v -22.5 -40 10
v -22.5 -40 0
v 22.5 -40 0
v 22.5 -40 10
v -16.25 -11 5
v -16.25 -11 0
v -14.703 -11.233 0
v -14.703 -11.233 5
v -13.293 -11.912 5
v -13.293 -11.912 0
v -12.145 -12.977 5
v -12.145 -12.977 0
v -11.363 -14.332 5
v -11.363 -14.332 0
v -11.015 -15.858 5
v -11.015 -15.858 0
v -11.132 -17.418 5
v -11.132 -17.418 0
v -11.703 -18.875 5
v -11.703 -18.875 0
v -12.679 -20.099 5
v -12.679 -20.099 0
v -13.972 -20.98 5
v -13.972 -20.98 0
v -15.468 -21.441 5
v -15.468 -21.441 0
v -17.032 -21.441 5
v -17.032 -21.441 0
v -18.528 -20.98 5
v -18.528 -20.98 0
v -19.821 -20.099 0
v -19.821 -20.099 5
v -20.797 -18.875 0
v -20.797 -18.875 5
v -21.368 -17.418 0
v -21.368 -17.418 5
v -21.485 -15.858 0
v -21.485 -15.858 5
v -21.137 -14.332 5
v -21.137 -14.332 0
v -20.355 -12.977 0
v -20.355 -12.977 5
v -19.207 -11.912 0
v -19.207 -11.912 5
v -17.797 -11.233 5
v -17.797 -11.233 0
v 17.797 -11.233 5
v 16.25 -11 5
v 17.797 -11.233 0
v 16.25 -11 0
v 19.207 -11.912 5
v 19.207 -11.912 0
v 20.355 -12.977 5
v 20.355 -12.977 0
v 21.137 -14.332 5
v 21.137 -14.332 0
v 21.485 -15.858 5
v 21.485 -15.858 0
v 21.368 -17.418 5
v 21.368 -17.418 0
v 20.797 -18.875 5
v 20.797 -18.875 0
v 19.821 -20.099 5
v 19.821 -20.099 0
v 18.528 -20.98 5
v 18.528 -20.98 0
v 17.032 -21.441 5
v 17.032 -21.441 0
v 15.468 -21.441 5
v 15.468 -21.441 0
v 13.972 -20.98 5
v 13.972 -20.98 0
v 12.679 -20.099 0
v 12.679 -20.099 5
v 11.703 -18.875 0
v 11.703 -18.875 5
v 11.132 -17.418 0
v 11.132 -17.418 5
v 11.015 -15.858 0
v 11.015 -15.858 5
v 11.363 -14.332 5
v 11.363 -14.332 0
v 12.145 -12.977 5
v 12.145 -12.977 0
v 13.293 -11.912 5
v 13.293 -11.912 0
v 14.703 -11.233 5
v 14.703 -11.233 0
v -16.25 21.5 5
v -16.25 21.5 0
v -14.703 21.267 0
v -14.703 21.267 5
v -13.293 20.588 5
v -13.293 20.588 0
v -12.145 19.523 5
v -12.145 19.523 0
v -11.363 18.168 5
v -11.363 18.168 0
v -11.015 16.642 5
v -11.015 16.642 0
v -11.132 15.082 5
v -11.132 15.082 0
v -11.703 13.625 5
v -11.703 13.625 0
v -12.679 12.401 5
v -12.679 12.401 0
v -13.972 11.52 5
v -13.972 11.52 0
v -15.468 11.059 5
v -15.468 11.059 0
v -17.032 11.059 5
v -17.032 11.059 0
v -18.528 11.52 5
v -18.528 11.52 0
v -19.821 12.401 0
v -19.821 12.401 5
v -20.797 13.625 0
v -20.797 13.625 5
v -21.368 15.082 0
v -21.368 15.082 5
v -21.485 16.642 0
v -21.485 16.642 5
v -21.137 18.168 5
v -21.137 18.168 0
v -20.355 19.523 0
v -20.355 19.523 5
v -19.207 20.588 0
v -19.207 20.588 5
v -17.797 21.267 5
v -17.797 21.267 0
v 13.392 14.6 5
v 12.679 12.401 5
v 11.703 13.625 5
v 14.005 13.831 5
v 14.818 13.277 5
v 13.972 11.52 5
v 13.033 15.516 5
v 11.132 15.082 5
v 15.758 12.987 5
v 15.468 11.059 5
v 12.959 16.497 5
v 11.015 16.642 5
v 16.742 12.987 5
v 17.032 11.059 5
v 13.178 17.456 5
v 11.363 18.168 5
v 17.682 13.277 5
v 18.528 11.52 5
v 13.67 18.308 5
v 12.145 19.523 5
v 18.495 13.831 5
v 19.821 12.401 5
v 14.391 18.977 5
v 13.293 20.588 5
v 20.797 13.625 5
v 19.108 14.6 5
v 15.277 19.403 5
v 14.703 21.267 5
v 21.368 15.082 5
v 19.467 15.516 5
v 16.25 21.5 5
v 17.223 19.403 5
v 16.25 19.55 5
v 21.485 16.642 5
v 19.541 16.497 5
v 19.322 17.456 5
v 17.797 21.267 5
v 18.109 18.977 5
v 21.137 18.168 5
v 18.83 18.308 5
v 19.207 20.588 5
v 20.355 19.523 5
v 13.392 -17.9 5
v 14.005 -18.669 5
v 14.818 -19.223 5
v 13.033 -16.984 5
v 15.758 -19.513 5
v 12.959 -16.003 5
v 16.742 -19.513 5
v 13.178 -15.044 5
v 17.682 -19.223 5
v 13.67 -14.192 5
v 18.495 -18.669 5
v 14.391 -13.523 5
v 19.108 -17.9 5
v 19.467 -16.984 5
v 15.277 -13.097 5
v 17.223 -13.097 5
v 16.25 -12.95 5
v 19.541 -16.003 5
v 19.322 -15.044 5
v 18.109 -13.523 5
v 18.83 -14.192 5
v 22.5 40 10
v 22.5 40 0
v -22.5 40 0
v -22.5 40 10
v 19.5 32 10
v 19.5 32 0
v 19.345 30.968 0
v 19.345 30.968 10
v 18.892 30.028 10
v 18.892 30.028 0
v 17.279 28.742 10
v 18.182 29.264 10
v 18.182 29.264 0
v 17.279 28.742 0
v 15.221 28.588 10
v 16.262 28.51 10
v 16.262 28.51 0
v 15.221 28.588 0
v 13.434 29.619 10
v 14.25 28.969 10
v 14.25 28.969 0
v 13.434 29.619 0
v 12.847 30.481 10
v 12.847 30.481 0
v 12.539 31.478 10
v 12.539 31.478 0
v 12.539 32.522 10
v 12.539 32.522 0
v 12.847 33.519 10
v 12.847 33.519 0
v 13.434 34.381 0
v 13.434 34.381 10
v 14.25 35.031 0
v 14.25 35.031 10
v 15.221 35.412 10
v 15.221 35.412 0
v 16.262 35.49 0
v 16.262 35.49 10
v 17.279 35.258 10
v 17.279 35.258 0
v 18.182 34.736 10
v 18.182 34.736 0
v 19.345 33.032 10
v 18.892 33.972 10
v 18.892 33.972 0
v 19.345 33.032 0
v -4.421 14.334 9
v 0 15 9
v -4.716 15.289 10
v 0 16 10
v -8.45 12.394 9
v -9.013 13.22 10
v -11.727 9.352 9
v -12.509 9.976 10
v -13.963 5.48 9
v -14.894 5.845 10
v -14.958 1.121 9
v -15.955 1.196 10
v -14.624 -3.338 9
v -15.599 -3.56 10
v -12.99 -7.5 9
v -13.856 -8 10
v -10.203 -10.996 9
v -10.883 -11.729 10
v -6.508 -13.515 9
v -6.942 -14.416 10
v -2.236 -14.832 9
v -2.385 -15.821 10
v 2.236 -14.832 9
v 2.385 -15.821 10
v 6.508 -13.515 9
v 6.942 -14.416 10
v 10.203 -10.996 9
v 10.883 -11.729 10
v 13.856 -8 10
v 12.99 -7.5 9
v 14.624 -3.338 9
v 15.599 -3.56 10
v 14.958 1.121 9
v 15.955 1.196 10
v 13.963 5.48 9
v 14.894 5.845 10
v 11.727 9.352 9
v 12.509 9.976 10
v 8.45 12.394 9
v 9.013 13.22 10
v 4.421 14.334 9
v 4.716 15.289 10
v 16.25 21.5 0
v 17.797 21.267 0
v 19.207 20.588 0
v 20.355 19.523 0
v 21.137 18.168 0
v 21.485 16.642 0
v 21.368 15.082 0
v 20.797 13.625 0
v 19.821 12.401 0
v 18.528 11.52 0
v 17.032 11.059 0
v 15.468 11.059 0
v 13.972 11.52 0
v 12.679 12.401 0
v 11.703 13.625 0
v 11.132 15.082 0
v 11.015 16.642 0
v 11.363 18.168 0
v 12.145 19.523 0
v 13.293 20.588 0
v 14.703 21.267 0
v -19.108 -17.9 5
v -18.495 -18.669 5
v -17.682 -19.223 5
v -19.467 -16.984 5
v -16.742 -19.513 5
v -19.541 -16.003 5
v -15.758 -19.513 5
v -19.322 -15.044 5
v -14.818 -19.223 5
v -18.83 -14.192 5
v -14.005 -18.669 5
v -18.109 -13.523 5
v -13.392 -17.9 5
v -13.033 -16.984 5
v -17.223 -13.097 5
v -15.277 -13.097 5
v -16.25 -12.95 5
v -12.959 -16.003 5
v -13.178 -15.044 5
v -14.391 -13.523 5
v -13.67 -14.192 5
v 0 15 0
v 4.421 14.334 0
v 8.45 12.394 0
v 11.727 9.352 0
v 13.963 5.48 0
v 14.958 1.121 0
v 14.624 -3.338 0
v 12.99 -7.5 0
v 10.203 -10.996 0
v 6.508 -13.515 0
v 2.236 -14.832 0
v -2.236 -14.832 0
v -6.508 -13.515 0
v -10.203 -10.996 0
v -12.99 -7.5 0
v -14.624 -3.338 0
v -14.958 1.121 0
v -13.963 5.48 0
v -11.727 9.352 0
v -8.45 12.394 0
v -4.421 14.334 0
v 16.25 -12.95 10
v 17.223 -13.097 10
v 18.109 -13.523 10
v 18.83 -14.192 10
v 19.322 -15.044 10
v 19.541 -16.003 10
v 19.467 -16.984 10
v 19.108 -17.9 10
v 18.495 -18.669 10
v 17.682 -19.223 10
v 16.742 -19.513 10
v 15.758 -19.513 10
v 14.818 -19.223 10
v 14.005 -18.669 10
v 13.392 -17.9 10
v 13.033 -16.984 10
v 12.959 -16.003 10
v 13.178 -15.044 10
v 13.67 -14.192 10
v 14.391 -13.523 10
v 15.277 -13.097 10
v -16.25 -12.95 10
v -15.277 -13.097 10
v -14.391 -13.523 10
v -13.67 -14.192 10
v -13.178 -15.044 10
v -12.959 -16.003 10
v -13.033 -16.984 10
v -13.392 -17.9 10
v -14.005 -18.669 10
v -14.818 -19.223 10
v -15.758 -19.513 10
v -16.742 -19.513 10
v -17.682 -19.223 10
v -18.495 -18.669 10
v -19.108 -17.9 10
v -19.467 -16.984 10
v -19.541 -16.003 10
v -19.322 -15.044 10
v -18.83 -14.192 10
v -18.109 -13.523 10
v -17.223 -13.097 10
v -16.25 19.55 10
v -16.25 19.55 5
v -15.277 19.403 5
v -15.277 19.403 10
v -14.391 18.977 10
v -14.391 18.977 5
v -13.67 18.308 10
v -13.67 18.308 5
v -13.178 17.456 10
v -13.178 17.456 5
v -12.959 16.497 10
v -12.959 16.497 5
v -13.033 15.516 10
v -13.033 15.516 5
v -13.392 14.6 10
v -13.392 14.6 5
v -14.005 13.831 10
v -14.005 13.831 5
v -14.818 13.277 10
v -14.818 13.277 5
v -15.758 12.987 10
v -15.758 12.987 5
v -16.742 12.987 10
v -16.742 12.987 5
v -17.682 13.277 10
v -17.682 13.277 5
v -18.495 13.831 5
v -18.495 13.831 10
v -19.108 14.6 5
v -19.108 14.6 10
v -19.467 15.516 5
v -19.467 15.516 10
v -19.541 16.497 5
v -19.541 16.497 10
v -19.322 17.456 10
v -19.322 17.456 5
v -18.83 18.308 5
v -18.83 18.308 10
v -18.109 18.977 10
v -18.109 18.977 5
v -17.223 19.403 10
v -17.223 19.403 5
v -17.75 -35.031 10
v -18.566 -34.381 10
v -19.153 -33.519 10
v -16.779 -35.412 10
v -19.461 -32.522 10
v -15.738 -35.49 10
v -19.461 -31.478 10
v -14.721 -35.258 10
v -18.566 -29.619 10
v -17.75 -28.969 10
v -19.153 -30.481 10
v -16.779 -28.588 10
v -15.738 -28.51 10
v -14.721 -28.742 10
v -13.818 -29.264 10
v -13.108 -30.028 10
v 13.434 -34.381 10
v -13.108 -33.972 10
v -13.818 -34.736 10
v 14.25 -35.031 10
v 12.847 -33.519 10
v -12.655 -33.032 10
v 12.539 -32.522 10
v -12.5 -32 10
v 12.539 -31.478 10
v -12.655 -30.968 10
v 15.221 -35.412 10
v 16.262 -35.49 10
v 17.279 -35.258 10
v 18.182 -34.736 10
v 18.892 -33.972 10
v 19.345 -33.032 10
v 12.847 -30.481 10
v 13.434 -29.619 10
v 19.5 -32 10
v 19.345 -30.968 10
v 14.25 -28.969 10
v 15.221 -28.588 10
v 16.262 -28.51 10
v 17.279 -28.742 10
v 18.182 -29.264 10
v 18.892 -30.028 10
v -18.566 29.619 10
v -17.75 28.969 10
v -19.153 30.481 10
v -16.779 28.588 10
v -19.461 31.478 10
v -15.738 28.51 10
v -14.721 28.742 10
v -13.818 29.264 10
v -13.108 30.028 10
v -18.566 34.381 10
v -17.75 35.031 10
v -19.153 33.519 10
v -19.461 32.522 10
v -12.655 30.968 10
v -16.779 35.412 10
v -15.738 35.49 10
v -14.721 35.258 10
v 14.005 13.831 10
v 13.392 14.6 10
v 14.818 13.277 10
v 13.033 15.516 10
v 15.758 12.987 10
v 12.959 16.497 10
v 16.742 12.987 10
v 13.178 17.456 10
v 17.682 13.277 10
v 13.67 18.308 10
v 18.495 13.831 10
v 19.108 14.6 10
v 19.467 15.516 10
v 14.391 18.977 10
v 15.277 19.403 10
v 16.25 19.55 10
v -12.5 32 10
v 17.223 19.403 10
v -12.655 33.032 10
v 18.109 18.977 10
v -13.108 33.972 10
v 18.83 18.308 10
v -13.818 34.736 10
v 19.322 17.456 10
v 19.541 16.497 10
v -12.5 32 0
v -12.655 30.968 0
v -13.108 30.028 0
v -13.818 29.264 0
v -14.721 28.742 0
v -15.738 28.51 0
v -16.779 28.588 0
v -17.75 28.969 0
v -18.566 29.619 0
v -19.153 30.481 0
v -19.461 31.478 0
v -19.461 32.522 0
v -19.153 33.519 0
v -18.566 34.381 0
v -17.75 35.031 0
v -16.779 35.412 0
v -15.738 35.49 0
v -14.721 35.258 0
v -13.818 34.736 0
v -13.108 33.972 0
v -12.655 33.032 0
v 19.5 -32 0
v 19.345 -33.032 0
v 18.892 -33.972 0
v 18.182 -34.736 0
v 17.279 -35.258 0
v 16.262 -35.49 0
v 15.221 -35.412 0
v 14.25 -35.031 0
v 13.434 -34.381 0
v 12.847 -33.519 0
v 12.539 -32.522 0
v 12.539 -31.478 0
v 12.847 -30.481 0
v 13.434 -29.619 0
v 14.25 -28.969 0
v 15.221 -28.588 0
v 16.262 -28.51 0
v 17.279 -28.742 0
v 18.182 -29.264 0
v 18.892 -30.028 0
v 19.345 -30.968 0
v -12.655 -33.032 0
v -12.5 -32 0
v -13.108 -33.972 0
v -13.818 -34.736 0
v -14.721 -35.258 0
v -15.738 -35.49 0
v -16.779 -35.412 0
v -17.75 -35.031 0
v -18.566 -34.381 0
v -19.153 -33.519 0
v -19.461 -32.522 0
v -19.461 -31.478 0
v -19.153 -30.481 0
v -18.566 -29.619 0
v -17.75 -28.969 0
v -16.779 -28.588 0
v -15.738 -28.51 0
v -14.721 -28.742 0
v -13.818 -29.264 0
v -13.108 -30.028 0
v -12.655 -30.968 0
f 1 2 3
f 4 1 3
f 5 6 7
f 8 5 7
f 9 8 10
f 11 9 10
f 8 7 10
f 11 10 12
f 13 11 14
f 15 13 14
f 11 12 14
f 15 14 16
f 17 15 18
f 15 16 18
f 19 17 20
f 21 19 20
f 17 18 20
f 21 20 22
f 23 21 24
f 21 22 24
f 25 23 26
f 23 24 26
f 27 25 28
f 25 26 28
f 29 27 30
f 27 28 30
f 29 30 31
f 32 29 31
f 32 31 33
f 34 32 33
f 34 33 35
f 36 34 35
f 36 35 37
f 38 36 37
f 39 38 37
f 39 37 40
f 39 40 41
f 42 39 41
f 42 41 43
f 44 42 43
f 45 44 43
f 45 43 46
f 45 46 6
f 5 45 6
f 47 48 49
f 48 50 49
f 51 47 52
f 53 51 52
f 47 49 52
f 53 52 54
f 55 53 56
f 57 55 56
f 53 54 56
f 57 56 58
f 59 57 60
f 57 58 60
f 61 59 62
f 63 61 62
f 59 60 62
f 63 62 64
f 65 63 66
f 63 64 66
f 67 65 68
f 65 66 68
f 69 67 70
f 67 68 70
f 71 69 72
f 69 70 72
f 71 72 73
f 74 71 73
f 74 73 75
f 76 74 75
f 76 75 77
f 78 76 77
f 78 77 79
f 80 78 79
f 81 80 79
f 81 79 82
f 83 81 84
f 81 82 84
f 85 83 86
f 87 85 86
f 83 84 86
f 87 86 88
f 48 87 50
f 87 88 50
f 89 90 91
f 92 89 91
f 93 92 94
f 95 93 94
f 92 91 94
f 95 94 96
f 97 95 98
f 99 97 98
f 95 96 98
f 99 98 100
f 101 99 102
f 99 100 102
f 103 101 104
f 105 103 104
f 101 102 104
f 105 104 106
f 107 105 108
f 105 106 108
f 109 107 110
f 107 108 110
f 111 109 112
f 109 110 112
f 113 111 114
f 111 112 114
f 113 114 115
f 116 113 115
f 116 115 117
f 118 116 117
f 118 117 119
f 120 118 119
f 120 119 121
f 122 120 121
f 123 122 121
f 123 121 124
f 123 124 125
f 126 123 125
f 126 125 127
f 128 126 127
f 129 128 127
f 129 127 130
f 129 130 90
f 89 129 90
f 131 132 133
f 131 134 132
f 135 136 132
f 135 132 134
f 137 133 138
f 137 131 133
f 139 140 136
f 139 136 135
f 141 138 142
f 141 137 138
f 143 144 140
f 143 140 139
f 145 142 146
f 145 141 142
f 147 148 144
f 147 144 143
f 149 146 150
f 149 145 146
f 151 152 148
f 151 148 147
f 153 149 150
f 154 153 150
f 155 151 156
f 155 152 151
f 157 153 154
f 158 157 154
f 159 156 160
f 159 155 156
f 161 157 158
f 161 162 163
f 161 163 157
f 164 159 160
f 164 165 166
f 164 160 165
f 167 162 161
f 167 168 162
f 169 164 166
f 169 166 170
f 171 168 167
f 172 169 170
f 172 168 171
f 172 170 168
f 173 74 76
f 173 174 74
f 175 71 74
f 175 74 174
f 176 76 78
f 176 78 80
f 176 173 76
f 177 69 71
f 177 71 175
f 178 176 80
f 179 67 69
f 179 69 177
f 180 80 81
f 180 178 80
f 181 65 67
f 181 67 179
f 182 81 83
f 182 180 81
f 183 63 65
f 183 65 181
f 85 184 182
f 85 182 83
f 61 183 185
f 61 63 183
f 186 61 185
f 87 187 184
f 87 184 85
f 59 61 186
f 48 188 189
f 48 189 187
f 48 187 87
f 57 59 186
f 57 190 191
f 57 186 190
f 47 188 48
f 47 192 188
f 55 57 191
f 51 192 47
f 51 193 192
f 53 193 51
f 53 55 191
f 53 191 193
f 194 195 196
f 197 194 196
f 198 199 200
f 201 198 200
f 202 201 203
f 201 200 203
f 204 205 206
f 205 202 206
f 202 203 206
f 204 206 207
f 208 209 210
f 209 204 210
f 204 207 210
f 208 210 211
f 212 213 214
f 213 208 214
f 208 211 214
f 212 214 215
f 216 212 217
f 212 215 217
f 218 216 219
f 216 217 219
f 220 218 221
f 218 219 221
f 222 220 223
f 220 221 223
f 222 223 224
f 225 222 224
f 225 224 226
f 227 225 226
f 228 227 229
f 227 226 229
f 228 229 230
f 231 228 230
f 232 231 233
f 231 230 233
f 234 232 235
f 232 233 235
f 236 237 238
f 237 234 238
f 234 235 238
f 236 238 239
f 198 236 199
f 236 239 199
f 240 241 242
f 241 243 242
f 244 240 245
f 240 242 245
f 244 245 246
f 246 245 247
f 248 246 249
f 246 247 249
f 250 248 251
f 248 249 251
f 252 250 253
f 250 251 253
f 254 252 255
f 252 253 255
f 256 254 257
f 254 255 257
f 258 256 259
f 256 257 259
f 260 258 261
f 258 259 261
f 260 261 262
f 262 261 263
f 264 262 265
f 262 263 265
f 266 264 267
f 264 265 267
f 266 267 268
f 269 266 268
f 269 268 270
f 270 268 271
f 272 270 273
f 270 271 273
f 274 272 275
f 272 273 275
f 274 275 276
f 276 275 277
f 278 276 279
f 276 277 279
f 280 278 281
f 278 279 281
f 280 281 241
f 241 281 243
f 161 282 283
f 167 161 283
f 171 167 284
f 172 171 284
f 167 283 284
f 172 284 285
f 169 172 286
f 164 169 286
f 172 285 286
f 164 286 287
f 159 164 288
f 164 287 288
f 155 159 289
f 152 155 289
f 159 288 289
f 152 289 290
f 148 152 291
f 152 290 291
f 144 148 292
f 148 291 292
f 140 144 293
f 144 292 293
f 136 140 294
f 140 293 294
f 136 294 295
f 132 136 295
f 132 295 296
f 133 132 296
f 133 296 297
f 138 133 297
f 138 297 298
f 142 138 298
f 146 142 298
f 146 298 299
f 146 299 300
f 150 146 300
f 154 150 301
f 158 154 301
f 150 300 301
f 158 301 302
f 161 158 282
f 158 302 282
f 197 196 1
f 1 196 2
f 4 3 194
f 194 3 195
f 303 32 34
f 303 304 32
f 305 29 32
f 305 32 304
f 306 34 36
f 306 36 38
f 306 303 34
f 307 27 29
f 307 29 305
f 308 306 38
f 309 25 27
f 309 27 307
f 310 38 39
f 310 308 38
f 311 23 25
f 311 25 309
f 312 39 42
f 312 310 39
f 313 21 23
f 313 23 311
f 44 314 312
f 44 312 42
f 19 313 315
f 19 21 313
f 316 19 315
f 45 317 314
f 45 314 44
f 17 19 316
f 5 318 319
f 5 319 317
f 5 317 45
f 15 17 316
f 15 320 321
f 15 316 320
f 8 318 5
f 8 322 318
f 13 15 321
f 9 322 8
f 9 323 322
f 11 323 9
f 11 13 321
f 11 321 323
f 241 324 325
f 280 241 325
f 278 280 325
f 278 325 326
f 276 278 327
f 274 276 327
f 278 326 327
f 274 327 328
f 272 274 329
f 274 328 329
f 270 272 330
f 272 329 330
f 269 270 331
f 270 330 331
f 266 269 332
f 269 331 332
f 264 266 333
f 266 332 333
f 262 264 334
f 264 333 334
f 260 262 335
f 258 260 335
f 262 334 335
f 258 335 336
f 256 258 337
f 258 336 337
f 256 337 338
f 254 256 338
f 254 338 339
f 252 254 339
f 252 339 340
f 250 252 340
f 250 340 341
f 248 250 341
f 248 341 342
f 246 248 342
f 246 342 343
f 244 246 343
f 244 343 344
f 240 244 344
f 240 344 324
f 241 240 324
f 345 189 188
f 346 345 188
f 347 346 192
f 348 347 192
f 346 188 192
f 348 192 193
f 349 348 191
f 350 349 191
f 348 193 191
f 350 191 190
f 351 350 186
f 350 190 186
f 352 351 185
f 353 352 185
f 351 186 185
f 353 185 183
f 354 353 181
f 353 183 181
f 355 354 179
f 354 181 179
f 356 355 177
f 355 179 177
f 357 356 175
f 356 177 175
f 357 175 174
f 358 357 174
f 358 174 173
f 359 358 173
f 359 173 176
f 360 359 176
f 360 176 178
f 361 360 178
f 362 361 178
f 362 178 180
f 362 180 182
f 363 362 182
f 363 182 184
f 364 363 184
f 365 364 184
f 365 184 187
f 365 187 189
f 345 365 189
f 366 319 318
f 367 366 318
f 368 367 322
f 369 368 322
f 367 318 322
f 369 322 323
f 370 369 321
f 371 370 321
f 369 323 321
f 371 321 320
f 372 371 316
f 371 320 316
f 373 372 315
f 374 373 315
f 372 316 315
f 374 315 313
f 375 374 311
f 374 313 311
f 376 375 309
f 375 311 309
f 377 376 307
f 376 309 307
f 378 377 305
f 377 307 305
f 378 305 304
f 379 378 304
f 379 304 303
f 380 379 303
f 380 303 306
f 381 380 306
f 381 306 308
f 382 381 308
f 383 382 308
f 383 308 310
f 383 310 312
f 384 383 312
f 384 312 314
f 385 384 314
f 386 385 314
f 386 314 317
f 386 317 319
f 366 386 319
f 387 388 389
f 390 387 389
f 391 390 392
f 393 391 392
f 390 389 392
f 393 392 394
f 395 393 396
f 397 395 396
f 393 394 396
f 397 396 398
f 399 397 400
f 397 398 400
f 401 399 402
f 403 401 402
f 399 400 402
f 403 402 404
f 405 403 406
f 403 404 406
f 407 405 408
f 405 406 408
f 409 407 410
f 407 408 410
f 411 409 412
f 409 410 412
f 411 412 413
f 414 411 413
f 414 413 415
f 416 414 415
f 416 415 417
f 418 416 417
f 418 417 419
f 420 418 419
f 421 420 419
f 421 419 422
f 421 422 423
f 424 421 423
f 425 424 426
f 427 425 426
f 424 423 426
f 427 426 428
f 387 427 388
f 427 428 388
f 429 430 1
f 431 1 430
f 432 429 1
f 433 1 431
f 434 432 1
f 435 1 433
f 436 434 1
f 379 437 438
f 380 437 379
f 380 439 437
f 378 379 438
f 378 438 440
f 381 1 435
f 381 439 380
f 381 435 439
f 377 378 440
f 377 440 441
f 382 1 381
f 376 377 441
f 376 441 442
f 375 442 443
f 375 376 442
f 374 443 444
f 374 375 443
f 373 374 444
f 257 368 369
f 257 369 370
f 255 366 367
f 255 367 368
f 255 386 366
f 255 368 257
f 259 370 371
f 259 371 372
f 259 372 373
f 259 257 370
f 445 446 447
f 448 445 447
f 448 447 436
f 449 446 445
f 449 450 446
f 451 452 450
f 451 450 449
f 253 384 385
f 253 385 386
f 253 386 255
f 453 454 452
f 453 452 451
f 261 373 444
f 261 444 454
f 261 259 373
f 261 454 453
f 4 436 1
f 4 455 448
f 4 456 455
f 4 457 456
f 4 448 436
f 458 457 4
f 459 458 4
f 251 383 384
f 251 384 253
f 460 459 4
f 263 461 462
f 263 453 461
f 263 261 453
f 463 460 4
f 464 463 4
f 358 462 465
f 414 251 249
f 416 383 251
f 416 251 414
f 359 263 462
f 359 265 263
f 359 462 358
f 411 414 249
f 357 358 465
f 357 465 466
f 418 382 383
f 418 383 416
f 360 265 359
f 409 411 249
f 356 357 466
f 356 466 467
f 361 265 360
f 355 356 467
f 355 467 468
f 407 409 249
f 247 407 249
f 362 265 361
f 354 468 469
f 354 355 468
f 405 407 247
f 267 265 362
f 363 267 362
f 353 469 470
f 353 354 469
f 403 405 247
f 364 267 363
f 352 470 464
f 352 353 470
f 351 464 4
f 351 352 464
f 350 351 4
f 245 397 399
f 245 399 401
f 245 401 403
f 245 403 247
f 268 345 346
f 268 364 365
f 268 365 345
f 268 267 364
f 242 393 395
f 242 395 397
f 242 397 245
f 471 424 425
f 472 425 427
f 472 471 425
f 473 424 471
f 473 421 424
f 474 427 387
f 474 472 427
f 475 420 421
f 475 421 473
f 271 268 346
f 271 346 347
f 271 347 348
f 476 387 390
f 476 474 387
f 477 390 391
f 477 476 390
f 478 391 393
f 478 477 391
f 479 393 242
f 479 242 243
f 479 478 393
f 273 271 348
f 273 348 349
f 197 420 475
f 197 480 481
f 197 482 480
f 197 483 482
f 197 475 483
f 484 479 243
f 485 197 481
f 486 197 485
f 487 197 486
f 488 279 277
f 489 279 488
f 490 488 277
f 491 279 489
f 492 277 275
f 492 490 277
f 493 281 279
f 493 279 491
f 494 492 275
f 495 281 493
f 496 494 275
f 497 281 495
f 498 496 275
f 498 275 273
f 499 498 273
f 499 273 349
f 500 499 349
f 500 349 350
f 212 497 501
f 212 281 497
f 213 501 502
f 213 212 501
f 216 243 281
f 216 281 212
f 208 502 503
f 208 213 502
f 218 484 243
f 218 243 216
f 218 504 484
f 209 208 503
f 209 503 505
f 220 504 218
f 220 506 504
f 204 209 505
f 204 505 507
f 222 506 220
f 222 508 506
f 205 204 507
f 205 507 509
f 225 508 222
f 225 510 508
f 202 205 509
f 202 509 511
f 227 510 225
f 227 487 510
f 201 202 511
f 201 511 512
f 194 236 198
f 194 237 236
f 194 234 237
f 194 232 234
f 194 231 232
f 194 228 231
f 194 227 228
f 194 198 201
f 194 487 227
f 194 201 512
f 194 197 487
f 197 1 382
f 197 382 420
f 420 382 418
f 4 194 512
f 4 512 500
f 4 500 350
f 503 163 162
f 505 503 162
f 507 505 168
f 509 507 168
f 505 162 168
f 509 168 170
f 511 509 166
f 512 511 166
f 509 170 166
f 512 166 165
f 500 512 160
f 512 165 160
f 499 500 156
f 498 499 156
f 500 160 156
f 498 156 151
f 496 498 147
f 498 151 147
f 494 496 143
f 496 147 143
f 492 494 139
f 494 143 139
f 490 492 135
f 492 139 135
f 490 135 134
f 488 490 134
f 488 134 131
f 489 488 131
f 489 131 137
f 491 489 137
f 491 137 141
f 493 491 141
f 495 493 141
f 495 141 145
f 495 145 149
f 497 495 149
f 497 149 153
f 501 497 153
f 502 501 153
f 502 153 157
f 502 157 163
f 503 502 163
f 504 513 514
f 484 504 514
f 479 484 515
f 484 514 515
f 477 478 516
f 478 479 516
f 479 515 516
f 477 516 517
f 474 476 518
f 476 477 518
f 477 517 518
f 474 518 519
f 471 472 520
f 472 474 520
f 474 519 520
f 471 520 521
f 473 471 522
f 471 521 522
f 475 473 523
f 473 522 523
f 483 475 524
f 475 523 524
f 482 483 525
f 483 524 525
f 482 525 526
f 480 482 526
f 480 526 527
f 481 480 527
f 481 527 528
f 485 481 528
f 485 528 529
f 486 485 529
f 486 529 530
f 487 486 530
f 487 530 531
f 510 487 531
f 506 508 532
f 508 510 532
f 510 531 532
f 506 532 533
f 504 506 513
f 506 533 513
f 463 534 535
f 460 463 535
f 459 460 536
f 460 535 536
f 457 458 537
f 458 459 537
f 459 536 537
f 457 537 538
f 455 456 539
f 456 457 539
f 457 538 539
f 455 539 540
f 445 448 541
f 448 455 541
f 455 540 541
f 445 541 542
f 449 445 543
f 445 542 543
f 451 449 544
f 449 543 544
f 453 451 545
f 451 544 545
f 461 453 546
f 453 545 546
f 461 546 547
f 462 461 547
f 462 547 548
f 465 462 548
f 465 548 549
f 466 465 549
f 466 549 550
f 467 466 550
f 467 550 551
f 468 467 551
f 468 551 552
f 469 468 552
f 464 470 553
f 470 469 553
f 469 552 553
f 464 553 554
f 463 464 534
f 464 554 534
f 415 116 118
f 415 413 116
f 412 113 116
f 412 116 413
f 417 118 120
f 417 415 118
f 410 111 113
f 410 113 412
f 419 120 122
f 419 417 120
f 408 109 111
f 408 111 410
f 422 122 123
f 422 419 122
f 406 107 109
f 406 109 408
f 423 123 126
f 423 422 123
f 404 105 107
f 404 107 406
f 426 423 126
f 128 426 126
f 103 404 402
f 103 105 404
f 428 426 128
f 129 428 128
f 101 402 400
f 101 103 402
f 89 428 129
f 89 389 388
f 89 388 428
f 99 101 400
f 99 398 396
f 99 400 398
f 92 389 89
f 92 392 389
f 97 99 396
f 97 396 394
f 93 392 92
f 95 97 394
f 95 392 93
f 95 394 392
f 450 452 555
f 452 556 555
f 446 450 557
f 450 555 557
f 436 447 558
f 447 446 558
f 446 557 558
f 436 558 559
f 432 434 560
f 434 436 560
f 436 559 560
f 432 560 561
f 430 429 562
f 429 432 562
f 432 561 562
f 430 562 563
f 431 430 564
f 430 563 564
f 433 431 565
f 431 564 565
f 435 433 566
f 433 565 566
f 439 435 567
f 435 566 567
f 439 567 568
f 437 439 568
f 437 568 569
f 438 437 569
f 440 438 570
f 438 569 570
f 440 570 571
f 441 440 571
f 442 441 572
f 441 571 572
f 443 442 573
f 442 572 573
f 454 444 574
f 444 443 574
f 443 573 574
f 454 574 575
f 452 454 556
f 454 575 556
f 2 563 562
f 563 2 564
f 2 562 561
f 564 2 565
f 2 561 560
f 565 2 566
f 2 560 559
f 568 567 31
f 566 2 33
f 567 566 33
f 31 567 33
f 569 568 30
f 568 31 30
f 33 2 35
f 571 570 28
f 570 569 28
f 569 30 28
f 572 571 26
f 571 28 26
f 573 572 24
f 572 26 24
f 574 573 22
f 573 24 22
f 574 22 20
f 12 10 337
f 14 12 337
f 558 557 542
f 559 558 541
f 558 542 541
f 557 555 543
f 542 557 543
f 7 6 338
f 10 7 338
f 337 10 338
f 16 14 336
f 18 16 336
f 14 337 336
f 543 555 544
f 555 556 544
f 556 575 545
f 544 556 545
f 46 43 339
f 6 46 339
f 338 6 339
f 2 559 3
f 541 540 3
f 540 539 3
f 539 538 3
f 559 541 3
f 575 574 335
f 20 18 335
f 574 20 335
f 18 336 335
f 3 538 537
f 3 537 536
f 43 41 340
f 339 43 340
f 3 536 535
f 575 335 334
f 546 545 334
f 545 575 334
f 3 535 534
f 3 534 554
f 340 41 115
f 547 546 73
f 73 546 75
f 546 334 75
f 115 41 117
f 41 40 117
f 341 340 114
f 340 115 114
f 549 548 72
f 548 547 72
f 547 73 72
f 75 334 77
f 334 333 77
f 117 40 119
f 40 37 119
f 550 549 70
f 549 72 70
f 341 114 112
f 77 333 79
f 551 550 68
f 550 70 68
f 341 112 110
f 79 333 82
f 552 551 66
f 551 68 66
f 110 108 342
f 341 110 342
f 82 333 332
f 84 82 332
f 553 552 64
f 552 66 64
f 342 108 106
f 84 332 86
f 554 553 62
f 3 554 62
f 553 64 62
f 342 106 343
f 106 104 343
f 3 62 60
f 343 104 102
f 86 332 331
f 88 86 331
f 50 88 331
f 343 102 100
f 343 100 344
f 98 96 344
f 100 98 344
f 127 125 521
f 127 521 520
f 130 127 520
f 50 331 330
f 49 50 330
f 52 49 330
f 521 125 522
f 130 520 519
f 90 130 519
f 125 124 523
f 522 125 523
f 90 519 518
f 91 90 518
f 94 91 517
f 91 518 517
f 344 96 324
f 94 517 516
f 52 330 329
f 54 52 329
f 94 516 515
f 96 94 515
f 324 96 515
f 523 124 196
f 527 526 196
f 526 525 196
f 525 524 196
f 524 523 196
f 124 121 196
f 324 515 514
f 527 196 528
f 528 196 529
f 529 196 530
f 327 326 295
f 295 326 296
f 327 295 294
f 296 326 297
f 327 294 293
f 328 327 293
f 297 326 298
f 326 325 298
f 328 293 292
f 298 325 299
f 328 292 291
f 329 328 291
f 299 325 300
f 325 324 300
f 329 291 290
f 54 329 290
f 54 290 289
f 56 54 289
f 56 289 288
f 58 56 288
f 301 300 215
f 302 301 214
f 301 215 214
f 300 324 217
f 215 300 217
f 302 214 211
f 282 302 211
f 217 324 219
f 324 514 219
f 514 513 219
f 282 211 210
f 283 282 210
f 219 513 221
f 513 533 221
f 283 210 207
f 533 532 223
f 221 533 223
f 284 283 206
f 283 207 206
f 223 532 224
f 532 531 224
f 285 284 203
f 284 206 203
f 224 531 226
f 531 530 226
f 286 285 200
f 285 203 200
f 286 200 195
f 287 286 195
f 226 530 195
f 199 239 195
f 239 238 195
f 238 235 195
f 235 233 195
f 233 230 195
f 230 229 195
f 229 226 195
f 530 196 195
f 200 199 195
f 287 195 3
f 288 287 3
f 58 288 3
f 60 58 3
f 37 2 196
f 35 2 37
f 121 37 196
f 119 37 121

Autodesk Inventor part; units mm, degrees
sketch "Skizze_1" plane through (0, 0, 0) normal (0, 0, 1) x (1, 0, 0)
  line L0 (-22.5, 40) -> (-22.5, -40)
  line L1 (-22.5, -40) -> (22.5, -40)
  line L2 (22.5, -40) -> (22.5, 40)
  line L3 (22.5, 40) -> (-22.5, 40)
  circle A0 centre (16, 32) radius 3.5
  circle A1 centre (16, -32) radius 3.5
  circle A2 centre (-16, 32) radius 3.5
  circle A3 centre (-16, -32) radius 3.5
extrude "Extrusion1" add sketch "Skizze_1" along normal blind 10
sketch "Skizze_2_ALT_Drilling_1" plane through (0, 0, 0) normal (1, 0, 0) x (0, 1, 0)
  line L0 (0, 0) -> (0, 10)
  line L1 (0, 10) -> (16, 10)
  line L2 (16, 10) -> (15, 9)
  line L3 (15, 9) -> (15, 0)
  line L4 (15, 0) -> (0, 0)
  line L5 (0, 0) -> (0, 10)
revolve "Revolution1" cut sketch "Skizze_2_ALT_Drilling_1" angle 360 about axis through (0, 0, 0) along (0, 0, -1)
sketch "Skizze_3_ALT_Drilling_2" plane through (16.25, 0, 0) normal (1, 0, 0) x (0, 0, -1)
  line L0 (0, 16.25) -> (-10, 16.25)
  line L1 (-10, 16.25) -> (-10, 19.55)
  line L2 (-10, 19.55) -> (-5, 19.55)
  line L3 (-5, 19.55) -> (-5, 21.5)
  line L4 (-5, 21.5) -> (0, 21.5)
  line L5 (0, 21.5) -> (0, 16.25)
  line L6 (0, 16.25) -> (-10, 16.25)
revolve "Revolution2" cut sketch "Skizze_3_ALT_Drilling_2" angle 360 about axis through (16.25, 16.25, 0) along (0, 0, -1)
sketch "Muster_1_SKETCH_1" plane through (-16.25, 0, 0) normal (1, 0, 0) x (0, 0, -1)
  line L0 (0, 16.25) -> (-10, 16.25)
  line L1 (-10, 16.25) -> (-10, 19.55)
  line L2 (-10, 19.55) -> (-5, 19.55)
  line L3 (-5, 19.55) -> (-5, 21.5)
  line L4 (-5, 21.5) -> (0, 21.5)
  line L5 (0, 21.5) -> (0, 16.25)
  line L6 (0, 16.25) -> (-10, 16.25)
sketch "Muster_1_SKETCH_2" plane through (16.25, 0, 0) normal (1, 0, 0) x (0, 0, -1)
  line L0 (0, -16.25) -> (-10, -16.25)
  line L1 (-10, -16.25) -> (-10, -12.95)
  line L2 (-10, -12.95) -> (-5, -12.95)
  line L3 (-5, -12.95) -> (-5, -11)
  line L4 (-5, -11) -> (0, -11)
  line L5 (0, -11) -> (0, -16.25)
  line L6 (0, -16.25) -> (-10, -16.25)
sketch "Muster_1_SKETCH_3" plane through (-16.25, 0, 0) normal (1, 0, 0) x (0, 0, -1)
  line L0 (0, -16.25) -> (-10, -16.25)
  line L1 (-10, -16.25) -> (-10, -12.95)
  line L2 (-10, -12.95) -> (-5, -12.95)
  line L3 (-5, -12.95) -> (-5, -11)
  line L4 (-5, -11) -> (0, -11)
  line L5 (0, -11) -> (0, -16.25)
  line L6 (0, -16.25) -> (-10, -16.25)
revolve "Revolution3" cut sketch "Muster_1_SKETCH_1" angle 360 about axis through (-16.25, 16.25, 0) along (0, 0, -1)
revolve "Revolution4" cut sketch "Muster_1_SKETCH_2" angle 360 about axis through (16.25, -16.25, 0) along (0, 0, -1)
revolve "Revolution5" cut sketch "Muster_1_SKETCH_3" angle 360 about axis through (-16.25, -16.25, 0) along (0, 0, -1)
ref_plane "FDT_MOUNT_XY" through (0, 0, 10) normal (0, 0, 1) x (0, 1, 0)
ref_plane "FDT_MOUNT_YZ" through (0, 0, 10) normal (0, 1, 0) x (-1, 0, 0)
ref_plane "FDT_MOUNT_ZX" through (0, 0, 10) normal (-1, 0, 0) x (0, 0, 1)
ref_plane "FNC_1_XY" through (0, 0, 5) normal (0, 0, 1) x (1, 0, 0)
ref_plane "FNC_1_YZ" through (0, 0, 5) normal (1, 0, 0) x (0, 1, 0)
ref_plane "FNC_1_ZX" through (0, 0, 5) normal (0, 1, 0) x (0, 0, 1)
ref_plane "FNC_2_3_XY" through (0, 0, 10) normal (0, 0, 1) x (1, 0, 0)
ref_plane "FNC_2_3_YZ" through (0, 0, 10) normal (1, 0, 0) x (0, 1, 0)
ref_plane "FNC_2_3_ZX" through (0, 0, 10) normal (0, 1, 0) x (0, 0, 1)
ref_plane "FNC_Schraube_1_XY" through (-16.25, 16.25, 5) normal (0, 0, 1) x (1, 0, 0)
ref_plane "FNC_Schraube_1_YZ" through (-16.25, 16.25, 5) normal (1, 0, 0) x (0, 1, 0)
ref_plane "FNC_Schraube_1_ZX" through (-16.25, 16.25, 5) normal (0, 1, 0) x (0, 0, 1)
ref_plane "FNC_Schraube_2_XY" through (16.25, 16.25, 5) normal (0, 0, 1) x (1, 0, 0)
ref_plane "FNC_Schraube_2_YZ" through (16.25, 16.25, 5) normal (1, 0, 0) x (0, 1, 0)
ref_plane "FNC_Schraube_2_ZX" through (16.25, 16.25, 5) normal (0, 1, 0) x (0, 0, 1)
ref_plane "FNC_Schraube_3_XY" through (-16.25, -16.25, 5) normal (0, 0, 1) x (1, 0, 0)
ref_plane "FNC_Schraube_3_YZ" through (-16.25, -16.25, 5) normal (1, 0, 0) x (0, 1, 0)
ref_plane "FNC_Schraube_3_ZX" through (-16.25, -16.25, 5) normal (0, 1, 0) x (0, 0, 1)
ref_plane "FNC_Schraube_4_XY" through (16.25, -16.25, 5) normal (0, 0, 1) x (1, 0, 0)
ref_plane "FNC_Schraube_4_YZ" through (16.25, -16.25, 5) normal (1, 0, 0) x (0, 1, 0)
ref_plane "FNC_Schraube_4_ZX" through (16.25, -16.25, 5) normal (0, 1, 0) x (0, 0, 1)
ref_plane "P17_XY" through (16, 32, 10) normal (0, 0, 1) x (1, 0, 0)
ref_plane "P17_YZ" through (16, 32, 10) normal (1, 0, 0) x (0, 1, 0)
ref_plane "P17_ZX" through (16, 32, 10) normal (0, 1, 0) x (0, 0, 1)
ref_plane "P18_XY" through (16, -32, 10) normal (0, 0, 1) x (1, 0, 0)
ref_plane "P18_YZ" through (16, -32, 10) normal (1, 0, 0) x (0, 1, 0)
ref_plane "P18_ZX" through (16, -32, 10) normal (0, 1, 0) x (0, 0, 1)
ref_plane "P19_XY" through (-16, -32, 10) normal (0, 0, 1) x (1, 0, 0)
ref_plane "P19_YZ" through (-16, -32, 10) normal (1, 0, 0) x (0, 1, 0)
ref_plane "P19_ZX" through (-16, -32, 10) normal (0, 1, 0) x (0, 0, 1)
ref_plane "P20_XY" through (-16, 32, 10) normal (0, 0, 1) x (1, 0, 0)
ref_plane "P20_YZ" through (-16, 32, 10) normal (1, 0, 0) x (0, 1, 0)
ref_plane "P20_ZX" through (-16, 32, 10) normal (0, 1, 0) x (0, 0, 1)
properties part number "174376 FNC-32---(F)"
